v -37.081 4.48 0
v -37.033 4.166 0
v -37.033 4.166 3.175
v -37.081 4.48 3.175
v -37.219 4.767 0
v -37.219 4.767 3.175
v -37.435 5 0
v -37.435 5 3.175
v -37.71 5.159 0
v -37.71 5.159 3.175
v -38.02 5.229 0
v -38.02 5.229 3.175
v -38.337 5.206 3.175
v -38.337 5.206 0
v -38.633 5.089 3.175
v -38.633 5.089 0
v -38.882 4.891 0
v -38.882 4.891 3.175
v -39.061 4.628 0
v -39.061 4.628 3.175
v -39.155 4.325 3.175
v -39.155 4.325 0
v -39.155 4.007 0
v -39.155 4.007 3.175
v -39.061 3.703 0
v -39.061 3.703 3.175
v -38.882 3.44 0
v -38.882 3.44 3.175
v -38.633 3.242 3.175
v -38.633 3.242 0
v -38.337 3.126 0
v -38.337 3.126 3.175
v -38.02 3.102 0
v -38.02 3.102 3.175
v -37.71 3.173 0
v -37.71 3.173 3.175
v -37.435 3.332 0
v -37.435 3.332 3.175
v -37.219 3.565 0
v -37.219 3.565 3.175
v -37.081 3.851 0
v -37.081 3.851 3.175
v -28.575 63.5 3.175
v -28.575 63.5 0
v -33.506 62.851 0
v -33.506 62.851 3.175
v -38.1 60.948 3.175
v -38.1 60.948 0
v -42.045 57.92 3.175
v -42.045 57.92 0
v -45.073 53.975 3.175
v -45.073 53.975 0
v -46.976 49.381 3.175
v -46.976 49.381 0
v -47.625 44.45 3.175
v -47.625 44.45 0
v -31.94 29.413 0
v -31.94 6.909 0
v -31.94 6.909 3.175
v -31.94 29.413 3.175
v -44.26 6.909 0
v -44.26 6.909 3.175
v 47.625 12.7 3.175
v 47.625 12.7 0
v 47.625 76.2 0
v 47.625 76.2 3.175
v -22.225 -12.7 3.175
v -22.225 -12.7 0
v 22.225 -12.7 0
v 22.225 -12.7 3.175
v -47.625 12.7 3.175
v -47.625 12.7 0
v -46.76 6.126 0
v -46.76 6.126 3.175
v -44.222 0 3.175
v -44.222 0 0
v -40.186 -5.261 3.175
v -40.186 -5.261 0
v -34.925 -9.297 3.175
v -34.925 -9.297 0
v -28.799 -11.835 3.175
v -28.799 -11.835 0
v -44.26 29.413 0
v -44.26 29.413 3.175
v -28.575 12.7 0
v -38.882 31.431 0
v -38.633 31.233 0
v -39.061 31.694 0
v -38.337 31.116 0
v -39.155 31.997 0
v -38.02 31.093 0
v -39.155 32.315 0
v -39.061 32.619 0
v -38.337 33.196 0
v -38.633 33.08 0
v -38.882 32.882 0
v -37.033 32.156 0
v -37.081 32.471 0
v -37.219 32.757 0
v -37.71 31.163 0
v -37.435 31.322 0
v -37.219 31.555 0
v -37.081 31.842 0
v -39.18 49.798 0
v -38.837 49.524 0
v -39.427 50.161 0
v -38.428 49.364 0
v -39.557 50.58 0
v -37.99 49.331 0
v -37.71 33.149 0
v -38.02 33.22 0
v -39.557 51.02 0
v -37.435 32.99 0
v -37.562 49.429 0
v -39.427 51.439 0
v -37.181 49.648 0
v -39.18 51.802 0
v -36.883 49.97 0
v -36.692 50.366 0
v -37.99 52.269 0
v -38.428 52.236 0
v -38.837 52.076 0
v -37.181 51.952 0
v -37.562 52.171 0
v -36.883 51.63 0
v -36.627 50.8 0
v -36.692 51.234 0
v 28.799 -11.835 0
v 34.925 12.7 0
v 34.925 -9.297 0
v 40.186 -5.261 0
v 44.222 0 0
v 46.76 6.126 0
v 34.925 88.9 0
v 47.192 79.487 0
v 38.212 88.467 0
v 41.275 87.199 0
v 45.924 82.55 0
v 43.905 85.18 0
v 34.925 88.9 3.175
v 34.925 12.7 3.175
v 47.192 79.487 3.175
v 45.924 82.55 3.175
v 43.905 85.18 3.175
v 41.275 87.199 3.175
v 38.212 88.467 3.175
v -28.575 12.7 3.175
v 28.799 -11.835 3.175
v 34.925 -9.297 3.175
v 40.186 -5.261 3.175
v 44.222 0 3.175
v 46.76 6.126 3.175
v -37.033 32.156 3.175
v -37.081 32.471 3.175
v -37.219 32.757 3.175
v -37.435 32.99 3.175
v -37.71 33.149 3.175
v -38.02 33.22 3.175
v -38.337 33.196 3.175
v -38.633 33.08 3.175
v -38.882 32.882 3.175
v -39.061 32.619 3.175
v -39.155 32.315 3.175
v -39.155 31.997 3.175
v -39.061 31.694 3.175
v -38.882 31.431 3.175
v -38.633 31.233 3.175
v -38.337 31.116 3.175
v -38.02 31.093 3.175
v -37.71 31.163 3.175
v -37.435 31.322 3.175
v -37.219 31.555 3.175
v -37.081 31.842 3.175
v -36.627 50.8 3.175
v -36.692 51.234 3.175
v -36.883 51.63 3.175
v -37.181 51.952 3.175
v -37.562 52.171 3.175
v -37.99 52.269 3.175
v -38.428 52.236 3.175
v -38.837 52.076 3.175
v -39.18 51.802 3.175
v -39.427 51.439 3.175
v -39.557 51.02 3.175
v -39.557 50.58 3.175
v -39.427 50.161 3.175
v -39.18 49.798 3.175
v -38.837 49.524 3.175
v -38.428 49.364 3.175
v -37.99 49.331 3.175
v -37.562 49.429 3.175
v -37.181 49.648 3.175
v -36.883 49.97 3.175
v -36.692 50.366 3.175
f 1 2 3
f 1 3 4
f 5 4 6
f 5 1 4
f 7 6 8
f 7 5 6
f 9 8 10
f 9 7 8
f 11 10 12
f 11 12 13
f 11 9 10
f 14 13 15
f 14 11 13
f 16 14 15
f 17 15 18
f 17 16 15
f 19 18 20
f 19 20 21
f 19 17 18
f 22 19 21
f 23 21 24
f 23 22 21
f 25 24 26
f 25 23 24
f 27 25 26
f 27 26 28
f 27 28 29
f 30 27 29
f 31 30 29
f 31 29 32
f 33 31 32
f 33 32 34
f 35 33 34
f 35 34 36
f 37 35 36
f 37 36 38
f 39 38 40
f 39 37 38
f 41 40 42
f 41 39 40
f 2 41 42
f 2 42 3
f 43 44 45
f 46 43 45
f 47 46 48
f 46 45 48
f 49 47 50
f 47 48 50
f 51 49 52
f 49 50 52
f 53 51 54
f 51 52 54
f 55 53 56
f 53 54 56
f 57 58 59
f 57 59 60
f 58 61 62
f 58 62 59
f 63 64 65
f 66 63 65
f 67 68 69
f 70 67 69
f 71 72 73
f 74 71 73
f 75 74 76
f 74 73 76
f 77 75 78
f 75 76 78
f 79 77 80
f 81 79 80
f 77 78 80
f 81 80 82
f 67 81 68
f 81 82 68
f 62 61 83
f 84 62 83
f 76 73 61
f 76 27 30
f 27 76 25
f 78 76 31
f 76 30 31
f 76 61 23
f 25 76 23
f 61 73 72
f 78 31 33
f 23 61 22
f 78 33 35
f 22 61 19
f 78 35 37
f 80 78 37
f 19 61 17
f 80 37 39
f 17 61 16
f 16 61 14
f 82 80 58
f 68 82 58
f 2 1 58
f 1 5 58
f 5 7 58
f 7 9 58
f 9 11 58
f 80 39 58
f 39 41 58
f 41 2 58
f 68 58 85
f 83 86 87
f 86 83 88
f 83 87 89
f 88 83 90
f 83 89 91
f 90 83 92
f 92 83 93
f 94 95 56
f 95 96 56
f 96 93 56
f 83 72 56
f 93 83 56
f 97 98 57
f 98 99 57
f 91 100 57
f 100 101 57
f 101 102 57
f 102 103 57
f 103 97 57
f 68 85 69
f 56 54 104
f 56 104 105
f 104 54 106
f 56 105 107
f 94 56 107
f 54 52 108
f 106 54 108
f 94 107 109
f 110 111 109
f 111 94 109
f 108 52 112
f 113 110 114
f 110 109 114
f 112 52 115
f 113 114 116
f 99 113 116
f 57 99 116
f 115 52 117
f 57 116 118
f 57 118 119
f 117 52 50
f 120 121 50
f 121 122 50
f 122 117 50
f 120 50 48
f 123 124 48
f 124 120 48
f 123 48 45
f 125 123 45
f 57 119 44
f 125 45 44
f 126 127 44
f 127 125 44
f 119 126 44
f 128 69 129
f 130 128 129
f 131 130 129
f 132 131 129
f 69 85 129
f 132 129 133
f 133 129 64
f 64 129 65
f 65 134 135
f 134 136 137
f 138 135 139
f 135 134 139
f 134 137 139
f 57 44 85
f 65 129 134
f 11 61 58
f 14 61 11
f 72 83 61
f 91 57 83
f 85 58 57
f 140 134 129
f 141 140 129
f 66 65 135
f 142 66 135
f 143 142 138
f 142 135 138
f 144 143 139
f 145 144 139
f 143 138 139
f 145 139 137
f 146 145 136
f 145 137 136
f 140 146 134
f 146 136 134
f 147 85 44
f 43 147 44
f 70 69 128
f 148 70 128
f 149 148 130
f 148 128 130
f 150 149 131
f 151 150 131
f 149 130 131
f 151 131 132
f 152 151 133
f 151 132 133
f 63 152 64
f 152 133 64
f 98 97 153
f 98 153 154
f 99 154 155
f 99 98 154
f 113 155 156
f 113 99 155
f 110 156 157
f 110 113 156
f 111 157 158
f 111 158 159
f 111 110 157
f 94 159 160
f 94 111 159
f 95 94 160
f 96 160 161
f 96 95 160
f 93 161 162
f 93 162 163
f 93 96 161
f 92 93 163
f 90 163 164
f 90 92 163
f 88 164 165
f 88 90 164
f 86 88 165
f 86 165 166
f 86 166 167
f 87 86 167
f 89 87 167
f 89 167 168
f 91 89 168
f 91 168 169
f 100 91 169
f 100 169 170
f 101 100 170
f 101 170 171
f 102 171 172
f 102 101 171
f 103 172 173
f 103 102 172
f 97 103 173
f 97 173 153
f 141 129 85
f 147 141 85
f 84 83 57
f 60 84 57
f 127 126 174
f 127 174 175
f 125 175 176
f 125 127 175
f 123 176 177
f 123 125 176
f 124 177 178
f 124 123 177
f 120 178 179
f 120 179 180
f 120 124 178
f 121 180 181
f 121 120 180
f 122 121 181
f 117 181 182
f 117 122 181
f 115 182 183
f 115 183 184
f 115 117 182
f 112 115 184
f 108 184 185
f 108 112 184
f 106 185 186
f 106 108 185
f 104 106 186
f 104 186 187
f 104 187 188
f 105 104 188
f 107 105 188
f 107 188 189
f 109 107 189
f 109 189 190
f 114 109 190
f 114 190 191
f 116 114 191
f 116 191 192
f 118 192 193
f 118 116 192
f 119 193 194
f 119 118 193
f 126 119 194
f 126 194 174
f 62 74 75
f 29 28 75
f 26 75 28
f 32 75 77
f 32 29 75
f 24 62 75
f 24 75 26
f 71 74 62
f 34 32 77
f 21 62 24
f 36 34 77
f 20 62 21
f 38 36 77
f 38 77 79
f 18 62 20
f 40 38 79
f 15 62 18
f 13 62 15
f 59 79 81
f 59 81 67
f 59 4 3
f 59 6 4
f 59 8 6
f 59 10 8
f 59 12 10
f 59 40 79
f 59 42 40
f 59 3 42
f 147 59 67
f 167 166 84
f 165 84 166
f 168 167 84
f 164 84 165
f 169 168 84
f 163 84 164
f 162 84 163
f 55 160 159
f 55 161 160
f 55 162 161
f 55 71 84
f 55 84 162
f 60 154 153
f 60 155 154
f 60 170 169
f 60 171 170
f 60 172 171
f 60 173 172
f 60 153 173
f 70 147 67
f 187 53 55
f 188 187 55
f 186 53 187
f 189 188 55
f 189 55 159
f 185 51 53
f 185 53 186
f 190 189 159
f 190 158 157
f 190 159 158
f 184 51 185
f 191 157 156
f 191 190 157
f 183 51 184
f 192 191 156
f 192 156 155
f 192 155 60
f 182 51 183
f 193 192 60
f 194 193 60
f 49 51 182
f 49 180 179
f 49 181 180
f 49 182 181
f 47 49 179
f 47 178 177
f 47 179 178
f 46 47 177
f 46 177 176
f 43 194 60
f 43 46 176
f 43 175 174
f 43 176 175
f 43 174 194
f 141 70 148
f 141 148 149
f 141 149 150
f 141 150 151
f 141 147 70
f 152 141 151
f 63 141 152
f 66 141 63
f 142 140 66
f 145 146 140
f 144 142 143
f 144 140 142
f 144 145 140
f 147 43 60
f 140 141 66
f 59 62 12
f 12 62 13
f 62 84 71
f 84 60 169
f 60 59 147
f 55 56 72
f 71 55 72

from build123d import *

# Parameters (mm, degrees)
F0_R     = 1.0668
F0_W     = 12.319
F0_H     = 22.5044
F0_R_2   = 1.4732
F1_DEPTH = 3.175


with BuildPart() as f1:
    # F0 (on Top) → F1 (new body)
    with BuildSketch(Plane.XY):
        with BuildLine():
            Line((34.925, 82.804), (34.925, 12.7))
            Line((34.925, 12.7), (-28.575, 12.7))
            Line((-28.575, 12.7), (-28.575, 63.5))
            ThreePointArc((-28.575, 63.5), (-42.045384, 57.920384), (-47.625, 44.45))
            Line((-47.625, 44.45), (-47.625, 12.7))
            ThreePointArc((-47.625, 12.7), (-40.185512, -5.260512), (-22.225, -12.7))
            Line((-22.225, -12.7), (22.225, -12.7))
            ThreePointArc((22.225, -12.7), (40.185512, -5.260512), (47.625, 12.7))
            Line((47.625, 12.7), (47.625, 76.2))
            ThreePointArc((47.625, 76.2), (43.905256, 85.180256), (34.925, 88.9))
            Line((34.925, 88.9), (34.925, 82.804))
        make_face()
        with Locations((-38.1, 4.1656)):
            Circle(F0_R, mode=Mode.SUBTRACT)
        with Locations((-38.1, 18.161)):
            Rectangle(F0_W, F0_H, mode=Mode.SUBTRACT)
        with Locations((-38.1, 32.1564)):
            Circle(F0_R, mode=Mode.SUBTRACT)
        with Locations((-38.1, 50.8)):
            Circle(F0_R_2, mode=Mode.SUBTRACT)
    extrude(amount=F1_DEPTH)


solid = f1.part
